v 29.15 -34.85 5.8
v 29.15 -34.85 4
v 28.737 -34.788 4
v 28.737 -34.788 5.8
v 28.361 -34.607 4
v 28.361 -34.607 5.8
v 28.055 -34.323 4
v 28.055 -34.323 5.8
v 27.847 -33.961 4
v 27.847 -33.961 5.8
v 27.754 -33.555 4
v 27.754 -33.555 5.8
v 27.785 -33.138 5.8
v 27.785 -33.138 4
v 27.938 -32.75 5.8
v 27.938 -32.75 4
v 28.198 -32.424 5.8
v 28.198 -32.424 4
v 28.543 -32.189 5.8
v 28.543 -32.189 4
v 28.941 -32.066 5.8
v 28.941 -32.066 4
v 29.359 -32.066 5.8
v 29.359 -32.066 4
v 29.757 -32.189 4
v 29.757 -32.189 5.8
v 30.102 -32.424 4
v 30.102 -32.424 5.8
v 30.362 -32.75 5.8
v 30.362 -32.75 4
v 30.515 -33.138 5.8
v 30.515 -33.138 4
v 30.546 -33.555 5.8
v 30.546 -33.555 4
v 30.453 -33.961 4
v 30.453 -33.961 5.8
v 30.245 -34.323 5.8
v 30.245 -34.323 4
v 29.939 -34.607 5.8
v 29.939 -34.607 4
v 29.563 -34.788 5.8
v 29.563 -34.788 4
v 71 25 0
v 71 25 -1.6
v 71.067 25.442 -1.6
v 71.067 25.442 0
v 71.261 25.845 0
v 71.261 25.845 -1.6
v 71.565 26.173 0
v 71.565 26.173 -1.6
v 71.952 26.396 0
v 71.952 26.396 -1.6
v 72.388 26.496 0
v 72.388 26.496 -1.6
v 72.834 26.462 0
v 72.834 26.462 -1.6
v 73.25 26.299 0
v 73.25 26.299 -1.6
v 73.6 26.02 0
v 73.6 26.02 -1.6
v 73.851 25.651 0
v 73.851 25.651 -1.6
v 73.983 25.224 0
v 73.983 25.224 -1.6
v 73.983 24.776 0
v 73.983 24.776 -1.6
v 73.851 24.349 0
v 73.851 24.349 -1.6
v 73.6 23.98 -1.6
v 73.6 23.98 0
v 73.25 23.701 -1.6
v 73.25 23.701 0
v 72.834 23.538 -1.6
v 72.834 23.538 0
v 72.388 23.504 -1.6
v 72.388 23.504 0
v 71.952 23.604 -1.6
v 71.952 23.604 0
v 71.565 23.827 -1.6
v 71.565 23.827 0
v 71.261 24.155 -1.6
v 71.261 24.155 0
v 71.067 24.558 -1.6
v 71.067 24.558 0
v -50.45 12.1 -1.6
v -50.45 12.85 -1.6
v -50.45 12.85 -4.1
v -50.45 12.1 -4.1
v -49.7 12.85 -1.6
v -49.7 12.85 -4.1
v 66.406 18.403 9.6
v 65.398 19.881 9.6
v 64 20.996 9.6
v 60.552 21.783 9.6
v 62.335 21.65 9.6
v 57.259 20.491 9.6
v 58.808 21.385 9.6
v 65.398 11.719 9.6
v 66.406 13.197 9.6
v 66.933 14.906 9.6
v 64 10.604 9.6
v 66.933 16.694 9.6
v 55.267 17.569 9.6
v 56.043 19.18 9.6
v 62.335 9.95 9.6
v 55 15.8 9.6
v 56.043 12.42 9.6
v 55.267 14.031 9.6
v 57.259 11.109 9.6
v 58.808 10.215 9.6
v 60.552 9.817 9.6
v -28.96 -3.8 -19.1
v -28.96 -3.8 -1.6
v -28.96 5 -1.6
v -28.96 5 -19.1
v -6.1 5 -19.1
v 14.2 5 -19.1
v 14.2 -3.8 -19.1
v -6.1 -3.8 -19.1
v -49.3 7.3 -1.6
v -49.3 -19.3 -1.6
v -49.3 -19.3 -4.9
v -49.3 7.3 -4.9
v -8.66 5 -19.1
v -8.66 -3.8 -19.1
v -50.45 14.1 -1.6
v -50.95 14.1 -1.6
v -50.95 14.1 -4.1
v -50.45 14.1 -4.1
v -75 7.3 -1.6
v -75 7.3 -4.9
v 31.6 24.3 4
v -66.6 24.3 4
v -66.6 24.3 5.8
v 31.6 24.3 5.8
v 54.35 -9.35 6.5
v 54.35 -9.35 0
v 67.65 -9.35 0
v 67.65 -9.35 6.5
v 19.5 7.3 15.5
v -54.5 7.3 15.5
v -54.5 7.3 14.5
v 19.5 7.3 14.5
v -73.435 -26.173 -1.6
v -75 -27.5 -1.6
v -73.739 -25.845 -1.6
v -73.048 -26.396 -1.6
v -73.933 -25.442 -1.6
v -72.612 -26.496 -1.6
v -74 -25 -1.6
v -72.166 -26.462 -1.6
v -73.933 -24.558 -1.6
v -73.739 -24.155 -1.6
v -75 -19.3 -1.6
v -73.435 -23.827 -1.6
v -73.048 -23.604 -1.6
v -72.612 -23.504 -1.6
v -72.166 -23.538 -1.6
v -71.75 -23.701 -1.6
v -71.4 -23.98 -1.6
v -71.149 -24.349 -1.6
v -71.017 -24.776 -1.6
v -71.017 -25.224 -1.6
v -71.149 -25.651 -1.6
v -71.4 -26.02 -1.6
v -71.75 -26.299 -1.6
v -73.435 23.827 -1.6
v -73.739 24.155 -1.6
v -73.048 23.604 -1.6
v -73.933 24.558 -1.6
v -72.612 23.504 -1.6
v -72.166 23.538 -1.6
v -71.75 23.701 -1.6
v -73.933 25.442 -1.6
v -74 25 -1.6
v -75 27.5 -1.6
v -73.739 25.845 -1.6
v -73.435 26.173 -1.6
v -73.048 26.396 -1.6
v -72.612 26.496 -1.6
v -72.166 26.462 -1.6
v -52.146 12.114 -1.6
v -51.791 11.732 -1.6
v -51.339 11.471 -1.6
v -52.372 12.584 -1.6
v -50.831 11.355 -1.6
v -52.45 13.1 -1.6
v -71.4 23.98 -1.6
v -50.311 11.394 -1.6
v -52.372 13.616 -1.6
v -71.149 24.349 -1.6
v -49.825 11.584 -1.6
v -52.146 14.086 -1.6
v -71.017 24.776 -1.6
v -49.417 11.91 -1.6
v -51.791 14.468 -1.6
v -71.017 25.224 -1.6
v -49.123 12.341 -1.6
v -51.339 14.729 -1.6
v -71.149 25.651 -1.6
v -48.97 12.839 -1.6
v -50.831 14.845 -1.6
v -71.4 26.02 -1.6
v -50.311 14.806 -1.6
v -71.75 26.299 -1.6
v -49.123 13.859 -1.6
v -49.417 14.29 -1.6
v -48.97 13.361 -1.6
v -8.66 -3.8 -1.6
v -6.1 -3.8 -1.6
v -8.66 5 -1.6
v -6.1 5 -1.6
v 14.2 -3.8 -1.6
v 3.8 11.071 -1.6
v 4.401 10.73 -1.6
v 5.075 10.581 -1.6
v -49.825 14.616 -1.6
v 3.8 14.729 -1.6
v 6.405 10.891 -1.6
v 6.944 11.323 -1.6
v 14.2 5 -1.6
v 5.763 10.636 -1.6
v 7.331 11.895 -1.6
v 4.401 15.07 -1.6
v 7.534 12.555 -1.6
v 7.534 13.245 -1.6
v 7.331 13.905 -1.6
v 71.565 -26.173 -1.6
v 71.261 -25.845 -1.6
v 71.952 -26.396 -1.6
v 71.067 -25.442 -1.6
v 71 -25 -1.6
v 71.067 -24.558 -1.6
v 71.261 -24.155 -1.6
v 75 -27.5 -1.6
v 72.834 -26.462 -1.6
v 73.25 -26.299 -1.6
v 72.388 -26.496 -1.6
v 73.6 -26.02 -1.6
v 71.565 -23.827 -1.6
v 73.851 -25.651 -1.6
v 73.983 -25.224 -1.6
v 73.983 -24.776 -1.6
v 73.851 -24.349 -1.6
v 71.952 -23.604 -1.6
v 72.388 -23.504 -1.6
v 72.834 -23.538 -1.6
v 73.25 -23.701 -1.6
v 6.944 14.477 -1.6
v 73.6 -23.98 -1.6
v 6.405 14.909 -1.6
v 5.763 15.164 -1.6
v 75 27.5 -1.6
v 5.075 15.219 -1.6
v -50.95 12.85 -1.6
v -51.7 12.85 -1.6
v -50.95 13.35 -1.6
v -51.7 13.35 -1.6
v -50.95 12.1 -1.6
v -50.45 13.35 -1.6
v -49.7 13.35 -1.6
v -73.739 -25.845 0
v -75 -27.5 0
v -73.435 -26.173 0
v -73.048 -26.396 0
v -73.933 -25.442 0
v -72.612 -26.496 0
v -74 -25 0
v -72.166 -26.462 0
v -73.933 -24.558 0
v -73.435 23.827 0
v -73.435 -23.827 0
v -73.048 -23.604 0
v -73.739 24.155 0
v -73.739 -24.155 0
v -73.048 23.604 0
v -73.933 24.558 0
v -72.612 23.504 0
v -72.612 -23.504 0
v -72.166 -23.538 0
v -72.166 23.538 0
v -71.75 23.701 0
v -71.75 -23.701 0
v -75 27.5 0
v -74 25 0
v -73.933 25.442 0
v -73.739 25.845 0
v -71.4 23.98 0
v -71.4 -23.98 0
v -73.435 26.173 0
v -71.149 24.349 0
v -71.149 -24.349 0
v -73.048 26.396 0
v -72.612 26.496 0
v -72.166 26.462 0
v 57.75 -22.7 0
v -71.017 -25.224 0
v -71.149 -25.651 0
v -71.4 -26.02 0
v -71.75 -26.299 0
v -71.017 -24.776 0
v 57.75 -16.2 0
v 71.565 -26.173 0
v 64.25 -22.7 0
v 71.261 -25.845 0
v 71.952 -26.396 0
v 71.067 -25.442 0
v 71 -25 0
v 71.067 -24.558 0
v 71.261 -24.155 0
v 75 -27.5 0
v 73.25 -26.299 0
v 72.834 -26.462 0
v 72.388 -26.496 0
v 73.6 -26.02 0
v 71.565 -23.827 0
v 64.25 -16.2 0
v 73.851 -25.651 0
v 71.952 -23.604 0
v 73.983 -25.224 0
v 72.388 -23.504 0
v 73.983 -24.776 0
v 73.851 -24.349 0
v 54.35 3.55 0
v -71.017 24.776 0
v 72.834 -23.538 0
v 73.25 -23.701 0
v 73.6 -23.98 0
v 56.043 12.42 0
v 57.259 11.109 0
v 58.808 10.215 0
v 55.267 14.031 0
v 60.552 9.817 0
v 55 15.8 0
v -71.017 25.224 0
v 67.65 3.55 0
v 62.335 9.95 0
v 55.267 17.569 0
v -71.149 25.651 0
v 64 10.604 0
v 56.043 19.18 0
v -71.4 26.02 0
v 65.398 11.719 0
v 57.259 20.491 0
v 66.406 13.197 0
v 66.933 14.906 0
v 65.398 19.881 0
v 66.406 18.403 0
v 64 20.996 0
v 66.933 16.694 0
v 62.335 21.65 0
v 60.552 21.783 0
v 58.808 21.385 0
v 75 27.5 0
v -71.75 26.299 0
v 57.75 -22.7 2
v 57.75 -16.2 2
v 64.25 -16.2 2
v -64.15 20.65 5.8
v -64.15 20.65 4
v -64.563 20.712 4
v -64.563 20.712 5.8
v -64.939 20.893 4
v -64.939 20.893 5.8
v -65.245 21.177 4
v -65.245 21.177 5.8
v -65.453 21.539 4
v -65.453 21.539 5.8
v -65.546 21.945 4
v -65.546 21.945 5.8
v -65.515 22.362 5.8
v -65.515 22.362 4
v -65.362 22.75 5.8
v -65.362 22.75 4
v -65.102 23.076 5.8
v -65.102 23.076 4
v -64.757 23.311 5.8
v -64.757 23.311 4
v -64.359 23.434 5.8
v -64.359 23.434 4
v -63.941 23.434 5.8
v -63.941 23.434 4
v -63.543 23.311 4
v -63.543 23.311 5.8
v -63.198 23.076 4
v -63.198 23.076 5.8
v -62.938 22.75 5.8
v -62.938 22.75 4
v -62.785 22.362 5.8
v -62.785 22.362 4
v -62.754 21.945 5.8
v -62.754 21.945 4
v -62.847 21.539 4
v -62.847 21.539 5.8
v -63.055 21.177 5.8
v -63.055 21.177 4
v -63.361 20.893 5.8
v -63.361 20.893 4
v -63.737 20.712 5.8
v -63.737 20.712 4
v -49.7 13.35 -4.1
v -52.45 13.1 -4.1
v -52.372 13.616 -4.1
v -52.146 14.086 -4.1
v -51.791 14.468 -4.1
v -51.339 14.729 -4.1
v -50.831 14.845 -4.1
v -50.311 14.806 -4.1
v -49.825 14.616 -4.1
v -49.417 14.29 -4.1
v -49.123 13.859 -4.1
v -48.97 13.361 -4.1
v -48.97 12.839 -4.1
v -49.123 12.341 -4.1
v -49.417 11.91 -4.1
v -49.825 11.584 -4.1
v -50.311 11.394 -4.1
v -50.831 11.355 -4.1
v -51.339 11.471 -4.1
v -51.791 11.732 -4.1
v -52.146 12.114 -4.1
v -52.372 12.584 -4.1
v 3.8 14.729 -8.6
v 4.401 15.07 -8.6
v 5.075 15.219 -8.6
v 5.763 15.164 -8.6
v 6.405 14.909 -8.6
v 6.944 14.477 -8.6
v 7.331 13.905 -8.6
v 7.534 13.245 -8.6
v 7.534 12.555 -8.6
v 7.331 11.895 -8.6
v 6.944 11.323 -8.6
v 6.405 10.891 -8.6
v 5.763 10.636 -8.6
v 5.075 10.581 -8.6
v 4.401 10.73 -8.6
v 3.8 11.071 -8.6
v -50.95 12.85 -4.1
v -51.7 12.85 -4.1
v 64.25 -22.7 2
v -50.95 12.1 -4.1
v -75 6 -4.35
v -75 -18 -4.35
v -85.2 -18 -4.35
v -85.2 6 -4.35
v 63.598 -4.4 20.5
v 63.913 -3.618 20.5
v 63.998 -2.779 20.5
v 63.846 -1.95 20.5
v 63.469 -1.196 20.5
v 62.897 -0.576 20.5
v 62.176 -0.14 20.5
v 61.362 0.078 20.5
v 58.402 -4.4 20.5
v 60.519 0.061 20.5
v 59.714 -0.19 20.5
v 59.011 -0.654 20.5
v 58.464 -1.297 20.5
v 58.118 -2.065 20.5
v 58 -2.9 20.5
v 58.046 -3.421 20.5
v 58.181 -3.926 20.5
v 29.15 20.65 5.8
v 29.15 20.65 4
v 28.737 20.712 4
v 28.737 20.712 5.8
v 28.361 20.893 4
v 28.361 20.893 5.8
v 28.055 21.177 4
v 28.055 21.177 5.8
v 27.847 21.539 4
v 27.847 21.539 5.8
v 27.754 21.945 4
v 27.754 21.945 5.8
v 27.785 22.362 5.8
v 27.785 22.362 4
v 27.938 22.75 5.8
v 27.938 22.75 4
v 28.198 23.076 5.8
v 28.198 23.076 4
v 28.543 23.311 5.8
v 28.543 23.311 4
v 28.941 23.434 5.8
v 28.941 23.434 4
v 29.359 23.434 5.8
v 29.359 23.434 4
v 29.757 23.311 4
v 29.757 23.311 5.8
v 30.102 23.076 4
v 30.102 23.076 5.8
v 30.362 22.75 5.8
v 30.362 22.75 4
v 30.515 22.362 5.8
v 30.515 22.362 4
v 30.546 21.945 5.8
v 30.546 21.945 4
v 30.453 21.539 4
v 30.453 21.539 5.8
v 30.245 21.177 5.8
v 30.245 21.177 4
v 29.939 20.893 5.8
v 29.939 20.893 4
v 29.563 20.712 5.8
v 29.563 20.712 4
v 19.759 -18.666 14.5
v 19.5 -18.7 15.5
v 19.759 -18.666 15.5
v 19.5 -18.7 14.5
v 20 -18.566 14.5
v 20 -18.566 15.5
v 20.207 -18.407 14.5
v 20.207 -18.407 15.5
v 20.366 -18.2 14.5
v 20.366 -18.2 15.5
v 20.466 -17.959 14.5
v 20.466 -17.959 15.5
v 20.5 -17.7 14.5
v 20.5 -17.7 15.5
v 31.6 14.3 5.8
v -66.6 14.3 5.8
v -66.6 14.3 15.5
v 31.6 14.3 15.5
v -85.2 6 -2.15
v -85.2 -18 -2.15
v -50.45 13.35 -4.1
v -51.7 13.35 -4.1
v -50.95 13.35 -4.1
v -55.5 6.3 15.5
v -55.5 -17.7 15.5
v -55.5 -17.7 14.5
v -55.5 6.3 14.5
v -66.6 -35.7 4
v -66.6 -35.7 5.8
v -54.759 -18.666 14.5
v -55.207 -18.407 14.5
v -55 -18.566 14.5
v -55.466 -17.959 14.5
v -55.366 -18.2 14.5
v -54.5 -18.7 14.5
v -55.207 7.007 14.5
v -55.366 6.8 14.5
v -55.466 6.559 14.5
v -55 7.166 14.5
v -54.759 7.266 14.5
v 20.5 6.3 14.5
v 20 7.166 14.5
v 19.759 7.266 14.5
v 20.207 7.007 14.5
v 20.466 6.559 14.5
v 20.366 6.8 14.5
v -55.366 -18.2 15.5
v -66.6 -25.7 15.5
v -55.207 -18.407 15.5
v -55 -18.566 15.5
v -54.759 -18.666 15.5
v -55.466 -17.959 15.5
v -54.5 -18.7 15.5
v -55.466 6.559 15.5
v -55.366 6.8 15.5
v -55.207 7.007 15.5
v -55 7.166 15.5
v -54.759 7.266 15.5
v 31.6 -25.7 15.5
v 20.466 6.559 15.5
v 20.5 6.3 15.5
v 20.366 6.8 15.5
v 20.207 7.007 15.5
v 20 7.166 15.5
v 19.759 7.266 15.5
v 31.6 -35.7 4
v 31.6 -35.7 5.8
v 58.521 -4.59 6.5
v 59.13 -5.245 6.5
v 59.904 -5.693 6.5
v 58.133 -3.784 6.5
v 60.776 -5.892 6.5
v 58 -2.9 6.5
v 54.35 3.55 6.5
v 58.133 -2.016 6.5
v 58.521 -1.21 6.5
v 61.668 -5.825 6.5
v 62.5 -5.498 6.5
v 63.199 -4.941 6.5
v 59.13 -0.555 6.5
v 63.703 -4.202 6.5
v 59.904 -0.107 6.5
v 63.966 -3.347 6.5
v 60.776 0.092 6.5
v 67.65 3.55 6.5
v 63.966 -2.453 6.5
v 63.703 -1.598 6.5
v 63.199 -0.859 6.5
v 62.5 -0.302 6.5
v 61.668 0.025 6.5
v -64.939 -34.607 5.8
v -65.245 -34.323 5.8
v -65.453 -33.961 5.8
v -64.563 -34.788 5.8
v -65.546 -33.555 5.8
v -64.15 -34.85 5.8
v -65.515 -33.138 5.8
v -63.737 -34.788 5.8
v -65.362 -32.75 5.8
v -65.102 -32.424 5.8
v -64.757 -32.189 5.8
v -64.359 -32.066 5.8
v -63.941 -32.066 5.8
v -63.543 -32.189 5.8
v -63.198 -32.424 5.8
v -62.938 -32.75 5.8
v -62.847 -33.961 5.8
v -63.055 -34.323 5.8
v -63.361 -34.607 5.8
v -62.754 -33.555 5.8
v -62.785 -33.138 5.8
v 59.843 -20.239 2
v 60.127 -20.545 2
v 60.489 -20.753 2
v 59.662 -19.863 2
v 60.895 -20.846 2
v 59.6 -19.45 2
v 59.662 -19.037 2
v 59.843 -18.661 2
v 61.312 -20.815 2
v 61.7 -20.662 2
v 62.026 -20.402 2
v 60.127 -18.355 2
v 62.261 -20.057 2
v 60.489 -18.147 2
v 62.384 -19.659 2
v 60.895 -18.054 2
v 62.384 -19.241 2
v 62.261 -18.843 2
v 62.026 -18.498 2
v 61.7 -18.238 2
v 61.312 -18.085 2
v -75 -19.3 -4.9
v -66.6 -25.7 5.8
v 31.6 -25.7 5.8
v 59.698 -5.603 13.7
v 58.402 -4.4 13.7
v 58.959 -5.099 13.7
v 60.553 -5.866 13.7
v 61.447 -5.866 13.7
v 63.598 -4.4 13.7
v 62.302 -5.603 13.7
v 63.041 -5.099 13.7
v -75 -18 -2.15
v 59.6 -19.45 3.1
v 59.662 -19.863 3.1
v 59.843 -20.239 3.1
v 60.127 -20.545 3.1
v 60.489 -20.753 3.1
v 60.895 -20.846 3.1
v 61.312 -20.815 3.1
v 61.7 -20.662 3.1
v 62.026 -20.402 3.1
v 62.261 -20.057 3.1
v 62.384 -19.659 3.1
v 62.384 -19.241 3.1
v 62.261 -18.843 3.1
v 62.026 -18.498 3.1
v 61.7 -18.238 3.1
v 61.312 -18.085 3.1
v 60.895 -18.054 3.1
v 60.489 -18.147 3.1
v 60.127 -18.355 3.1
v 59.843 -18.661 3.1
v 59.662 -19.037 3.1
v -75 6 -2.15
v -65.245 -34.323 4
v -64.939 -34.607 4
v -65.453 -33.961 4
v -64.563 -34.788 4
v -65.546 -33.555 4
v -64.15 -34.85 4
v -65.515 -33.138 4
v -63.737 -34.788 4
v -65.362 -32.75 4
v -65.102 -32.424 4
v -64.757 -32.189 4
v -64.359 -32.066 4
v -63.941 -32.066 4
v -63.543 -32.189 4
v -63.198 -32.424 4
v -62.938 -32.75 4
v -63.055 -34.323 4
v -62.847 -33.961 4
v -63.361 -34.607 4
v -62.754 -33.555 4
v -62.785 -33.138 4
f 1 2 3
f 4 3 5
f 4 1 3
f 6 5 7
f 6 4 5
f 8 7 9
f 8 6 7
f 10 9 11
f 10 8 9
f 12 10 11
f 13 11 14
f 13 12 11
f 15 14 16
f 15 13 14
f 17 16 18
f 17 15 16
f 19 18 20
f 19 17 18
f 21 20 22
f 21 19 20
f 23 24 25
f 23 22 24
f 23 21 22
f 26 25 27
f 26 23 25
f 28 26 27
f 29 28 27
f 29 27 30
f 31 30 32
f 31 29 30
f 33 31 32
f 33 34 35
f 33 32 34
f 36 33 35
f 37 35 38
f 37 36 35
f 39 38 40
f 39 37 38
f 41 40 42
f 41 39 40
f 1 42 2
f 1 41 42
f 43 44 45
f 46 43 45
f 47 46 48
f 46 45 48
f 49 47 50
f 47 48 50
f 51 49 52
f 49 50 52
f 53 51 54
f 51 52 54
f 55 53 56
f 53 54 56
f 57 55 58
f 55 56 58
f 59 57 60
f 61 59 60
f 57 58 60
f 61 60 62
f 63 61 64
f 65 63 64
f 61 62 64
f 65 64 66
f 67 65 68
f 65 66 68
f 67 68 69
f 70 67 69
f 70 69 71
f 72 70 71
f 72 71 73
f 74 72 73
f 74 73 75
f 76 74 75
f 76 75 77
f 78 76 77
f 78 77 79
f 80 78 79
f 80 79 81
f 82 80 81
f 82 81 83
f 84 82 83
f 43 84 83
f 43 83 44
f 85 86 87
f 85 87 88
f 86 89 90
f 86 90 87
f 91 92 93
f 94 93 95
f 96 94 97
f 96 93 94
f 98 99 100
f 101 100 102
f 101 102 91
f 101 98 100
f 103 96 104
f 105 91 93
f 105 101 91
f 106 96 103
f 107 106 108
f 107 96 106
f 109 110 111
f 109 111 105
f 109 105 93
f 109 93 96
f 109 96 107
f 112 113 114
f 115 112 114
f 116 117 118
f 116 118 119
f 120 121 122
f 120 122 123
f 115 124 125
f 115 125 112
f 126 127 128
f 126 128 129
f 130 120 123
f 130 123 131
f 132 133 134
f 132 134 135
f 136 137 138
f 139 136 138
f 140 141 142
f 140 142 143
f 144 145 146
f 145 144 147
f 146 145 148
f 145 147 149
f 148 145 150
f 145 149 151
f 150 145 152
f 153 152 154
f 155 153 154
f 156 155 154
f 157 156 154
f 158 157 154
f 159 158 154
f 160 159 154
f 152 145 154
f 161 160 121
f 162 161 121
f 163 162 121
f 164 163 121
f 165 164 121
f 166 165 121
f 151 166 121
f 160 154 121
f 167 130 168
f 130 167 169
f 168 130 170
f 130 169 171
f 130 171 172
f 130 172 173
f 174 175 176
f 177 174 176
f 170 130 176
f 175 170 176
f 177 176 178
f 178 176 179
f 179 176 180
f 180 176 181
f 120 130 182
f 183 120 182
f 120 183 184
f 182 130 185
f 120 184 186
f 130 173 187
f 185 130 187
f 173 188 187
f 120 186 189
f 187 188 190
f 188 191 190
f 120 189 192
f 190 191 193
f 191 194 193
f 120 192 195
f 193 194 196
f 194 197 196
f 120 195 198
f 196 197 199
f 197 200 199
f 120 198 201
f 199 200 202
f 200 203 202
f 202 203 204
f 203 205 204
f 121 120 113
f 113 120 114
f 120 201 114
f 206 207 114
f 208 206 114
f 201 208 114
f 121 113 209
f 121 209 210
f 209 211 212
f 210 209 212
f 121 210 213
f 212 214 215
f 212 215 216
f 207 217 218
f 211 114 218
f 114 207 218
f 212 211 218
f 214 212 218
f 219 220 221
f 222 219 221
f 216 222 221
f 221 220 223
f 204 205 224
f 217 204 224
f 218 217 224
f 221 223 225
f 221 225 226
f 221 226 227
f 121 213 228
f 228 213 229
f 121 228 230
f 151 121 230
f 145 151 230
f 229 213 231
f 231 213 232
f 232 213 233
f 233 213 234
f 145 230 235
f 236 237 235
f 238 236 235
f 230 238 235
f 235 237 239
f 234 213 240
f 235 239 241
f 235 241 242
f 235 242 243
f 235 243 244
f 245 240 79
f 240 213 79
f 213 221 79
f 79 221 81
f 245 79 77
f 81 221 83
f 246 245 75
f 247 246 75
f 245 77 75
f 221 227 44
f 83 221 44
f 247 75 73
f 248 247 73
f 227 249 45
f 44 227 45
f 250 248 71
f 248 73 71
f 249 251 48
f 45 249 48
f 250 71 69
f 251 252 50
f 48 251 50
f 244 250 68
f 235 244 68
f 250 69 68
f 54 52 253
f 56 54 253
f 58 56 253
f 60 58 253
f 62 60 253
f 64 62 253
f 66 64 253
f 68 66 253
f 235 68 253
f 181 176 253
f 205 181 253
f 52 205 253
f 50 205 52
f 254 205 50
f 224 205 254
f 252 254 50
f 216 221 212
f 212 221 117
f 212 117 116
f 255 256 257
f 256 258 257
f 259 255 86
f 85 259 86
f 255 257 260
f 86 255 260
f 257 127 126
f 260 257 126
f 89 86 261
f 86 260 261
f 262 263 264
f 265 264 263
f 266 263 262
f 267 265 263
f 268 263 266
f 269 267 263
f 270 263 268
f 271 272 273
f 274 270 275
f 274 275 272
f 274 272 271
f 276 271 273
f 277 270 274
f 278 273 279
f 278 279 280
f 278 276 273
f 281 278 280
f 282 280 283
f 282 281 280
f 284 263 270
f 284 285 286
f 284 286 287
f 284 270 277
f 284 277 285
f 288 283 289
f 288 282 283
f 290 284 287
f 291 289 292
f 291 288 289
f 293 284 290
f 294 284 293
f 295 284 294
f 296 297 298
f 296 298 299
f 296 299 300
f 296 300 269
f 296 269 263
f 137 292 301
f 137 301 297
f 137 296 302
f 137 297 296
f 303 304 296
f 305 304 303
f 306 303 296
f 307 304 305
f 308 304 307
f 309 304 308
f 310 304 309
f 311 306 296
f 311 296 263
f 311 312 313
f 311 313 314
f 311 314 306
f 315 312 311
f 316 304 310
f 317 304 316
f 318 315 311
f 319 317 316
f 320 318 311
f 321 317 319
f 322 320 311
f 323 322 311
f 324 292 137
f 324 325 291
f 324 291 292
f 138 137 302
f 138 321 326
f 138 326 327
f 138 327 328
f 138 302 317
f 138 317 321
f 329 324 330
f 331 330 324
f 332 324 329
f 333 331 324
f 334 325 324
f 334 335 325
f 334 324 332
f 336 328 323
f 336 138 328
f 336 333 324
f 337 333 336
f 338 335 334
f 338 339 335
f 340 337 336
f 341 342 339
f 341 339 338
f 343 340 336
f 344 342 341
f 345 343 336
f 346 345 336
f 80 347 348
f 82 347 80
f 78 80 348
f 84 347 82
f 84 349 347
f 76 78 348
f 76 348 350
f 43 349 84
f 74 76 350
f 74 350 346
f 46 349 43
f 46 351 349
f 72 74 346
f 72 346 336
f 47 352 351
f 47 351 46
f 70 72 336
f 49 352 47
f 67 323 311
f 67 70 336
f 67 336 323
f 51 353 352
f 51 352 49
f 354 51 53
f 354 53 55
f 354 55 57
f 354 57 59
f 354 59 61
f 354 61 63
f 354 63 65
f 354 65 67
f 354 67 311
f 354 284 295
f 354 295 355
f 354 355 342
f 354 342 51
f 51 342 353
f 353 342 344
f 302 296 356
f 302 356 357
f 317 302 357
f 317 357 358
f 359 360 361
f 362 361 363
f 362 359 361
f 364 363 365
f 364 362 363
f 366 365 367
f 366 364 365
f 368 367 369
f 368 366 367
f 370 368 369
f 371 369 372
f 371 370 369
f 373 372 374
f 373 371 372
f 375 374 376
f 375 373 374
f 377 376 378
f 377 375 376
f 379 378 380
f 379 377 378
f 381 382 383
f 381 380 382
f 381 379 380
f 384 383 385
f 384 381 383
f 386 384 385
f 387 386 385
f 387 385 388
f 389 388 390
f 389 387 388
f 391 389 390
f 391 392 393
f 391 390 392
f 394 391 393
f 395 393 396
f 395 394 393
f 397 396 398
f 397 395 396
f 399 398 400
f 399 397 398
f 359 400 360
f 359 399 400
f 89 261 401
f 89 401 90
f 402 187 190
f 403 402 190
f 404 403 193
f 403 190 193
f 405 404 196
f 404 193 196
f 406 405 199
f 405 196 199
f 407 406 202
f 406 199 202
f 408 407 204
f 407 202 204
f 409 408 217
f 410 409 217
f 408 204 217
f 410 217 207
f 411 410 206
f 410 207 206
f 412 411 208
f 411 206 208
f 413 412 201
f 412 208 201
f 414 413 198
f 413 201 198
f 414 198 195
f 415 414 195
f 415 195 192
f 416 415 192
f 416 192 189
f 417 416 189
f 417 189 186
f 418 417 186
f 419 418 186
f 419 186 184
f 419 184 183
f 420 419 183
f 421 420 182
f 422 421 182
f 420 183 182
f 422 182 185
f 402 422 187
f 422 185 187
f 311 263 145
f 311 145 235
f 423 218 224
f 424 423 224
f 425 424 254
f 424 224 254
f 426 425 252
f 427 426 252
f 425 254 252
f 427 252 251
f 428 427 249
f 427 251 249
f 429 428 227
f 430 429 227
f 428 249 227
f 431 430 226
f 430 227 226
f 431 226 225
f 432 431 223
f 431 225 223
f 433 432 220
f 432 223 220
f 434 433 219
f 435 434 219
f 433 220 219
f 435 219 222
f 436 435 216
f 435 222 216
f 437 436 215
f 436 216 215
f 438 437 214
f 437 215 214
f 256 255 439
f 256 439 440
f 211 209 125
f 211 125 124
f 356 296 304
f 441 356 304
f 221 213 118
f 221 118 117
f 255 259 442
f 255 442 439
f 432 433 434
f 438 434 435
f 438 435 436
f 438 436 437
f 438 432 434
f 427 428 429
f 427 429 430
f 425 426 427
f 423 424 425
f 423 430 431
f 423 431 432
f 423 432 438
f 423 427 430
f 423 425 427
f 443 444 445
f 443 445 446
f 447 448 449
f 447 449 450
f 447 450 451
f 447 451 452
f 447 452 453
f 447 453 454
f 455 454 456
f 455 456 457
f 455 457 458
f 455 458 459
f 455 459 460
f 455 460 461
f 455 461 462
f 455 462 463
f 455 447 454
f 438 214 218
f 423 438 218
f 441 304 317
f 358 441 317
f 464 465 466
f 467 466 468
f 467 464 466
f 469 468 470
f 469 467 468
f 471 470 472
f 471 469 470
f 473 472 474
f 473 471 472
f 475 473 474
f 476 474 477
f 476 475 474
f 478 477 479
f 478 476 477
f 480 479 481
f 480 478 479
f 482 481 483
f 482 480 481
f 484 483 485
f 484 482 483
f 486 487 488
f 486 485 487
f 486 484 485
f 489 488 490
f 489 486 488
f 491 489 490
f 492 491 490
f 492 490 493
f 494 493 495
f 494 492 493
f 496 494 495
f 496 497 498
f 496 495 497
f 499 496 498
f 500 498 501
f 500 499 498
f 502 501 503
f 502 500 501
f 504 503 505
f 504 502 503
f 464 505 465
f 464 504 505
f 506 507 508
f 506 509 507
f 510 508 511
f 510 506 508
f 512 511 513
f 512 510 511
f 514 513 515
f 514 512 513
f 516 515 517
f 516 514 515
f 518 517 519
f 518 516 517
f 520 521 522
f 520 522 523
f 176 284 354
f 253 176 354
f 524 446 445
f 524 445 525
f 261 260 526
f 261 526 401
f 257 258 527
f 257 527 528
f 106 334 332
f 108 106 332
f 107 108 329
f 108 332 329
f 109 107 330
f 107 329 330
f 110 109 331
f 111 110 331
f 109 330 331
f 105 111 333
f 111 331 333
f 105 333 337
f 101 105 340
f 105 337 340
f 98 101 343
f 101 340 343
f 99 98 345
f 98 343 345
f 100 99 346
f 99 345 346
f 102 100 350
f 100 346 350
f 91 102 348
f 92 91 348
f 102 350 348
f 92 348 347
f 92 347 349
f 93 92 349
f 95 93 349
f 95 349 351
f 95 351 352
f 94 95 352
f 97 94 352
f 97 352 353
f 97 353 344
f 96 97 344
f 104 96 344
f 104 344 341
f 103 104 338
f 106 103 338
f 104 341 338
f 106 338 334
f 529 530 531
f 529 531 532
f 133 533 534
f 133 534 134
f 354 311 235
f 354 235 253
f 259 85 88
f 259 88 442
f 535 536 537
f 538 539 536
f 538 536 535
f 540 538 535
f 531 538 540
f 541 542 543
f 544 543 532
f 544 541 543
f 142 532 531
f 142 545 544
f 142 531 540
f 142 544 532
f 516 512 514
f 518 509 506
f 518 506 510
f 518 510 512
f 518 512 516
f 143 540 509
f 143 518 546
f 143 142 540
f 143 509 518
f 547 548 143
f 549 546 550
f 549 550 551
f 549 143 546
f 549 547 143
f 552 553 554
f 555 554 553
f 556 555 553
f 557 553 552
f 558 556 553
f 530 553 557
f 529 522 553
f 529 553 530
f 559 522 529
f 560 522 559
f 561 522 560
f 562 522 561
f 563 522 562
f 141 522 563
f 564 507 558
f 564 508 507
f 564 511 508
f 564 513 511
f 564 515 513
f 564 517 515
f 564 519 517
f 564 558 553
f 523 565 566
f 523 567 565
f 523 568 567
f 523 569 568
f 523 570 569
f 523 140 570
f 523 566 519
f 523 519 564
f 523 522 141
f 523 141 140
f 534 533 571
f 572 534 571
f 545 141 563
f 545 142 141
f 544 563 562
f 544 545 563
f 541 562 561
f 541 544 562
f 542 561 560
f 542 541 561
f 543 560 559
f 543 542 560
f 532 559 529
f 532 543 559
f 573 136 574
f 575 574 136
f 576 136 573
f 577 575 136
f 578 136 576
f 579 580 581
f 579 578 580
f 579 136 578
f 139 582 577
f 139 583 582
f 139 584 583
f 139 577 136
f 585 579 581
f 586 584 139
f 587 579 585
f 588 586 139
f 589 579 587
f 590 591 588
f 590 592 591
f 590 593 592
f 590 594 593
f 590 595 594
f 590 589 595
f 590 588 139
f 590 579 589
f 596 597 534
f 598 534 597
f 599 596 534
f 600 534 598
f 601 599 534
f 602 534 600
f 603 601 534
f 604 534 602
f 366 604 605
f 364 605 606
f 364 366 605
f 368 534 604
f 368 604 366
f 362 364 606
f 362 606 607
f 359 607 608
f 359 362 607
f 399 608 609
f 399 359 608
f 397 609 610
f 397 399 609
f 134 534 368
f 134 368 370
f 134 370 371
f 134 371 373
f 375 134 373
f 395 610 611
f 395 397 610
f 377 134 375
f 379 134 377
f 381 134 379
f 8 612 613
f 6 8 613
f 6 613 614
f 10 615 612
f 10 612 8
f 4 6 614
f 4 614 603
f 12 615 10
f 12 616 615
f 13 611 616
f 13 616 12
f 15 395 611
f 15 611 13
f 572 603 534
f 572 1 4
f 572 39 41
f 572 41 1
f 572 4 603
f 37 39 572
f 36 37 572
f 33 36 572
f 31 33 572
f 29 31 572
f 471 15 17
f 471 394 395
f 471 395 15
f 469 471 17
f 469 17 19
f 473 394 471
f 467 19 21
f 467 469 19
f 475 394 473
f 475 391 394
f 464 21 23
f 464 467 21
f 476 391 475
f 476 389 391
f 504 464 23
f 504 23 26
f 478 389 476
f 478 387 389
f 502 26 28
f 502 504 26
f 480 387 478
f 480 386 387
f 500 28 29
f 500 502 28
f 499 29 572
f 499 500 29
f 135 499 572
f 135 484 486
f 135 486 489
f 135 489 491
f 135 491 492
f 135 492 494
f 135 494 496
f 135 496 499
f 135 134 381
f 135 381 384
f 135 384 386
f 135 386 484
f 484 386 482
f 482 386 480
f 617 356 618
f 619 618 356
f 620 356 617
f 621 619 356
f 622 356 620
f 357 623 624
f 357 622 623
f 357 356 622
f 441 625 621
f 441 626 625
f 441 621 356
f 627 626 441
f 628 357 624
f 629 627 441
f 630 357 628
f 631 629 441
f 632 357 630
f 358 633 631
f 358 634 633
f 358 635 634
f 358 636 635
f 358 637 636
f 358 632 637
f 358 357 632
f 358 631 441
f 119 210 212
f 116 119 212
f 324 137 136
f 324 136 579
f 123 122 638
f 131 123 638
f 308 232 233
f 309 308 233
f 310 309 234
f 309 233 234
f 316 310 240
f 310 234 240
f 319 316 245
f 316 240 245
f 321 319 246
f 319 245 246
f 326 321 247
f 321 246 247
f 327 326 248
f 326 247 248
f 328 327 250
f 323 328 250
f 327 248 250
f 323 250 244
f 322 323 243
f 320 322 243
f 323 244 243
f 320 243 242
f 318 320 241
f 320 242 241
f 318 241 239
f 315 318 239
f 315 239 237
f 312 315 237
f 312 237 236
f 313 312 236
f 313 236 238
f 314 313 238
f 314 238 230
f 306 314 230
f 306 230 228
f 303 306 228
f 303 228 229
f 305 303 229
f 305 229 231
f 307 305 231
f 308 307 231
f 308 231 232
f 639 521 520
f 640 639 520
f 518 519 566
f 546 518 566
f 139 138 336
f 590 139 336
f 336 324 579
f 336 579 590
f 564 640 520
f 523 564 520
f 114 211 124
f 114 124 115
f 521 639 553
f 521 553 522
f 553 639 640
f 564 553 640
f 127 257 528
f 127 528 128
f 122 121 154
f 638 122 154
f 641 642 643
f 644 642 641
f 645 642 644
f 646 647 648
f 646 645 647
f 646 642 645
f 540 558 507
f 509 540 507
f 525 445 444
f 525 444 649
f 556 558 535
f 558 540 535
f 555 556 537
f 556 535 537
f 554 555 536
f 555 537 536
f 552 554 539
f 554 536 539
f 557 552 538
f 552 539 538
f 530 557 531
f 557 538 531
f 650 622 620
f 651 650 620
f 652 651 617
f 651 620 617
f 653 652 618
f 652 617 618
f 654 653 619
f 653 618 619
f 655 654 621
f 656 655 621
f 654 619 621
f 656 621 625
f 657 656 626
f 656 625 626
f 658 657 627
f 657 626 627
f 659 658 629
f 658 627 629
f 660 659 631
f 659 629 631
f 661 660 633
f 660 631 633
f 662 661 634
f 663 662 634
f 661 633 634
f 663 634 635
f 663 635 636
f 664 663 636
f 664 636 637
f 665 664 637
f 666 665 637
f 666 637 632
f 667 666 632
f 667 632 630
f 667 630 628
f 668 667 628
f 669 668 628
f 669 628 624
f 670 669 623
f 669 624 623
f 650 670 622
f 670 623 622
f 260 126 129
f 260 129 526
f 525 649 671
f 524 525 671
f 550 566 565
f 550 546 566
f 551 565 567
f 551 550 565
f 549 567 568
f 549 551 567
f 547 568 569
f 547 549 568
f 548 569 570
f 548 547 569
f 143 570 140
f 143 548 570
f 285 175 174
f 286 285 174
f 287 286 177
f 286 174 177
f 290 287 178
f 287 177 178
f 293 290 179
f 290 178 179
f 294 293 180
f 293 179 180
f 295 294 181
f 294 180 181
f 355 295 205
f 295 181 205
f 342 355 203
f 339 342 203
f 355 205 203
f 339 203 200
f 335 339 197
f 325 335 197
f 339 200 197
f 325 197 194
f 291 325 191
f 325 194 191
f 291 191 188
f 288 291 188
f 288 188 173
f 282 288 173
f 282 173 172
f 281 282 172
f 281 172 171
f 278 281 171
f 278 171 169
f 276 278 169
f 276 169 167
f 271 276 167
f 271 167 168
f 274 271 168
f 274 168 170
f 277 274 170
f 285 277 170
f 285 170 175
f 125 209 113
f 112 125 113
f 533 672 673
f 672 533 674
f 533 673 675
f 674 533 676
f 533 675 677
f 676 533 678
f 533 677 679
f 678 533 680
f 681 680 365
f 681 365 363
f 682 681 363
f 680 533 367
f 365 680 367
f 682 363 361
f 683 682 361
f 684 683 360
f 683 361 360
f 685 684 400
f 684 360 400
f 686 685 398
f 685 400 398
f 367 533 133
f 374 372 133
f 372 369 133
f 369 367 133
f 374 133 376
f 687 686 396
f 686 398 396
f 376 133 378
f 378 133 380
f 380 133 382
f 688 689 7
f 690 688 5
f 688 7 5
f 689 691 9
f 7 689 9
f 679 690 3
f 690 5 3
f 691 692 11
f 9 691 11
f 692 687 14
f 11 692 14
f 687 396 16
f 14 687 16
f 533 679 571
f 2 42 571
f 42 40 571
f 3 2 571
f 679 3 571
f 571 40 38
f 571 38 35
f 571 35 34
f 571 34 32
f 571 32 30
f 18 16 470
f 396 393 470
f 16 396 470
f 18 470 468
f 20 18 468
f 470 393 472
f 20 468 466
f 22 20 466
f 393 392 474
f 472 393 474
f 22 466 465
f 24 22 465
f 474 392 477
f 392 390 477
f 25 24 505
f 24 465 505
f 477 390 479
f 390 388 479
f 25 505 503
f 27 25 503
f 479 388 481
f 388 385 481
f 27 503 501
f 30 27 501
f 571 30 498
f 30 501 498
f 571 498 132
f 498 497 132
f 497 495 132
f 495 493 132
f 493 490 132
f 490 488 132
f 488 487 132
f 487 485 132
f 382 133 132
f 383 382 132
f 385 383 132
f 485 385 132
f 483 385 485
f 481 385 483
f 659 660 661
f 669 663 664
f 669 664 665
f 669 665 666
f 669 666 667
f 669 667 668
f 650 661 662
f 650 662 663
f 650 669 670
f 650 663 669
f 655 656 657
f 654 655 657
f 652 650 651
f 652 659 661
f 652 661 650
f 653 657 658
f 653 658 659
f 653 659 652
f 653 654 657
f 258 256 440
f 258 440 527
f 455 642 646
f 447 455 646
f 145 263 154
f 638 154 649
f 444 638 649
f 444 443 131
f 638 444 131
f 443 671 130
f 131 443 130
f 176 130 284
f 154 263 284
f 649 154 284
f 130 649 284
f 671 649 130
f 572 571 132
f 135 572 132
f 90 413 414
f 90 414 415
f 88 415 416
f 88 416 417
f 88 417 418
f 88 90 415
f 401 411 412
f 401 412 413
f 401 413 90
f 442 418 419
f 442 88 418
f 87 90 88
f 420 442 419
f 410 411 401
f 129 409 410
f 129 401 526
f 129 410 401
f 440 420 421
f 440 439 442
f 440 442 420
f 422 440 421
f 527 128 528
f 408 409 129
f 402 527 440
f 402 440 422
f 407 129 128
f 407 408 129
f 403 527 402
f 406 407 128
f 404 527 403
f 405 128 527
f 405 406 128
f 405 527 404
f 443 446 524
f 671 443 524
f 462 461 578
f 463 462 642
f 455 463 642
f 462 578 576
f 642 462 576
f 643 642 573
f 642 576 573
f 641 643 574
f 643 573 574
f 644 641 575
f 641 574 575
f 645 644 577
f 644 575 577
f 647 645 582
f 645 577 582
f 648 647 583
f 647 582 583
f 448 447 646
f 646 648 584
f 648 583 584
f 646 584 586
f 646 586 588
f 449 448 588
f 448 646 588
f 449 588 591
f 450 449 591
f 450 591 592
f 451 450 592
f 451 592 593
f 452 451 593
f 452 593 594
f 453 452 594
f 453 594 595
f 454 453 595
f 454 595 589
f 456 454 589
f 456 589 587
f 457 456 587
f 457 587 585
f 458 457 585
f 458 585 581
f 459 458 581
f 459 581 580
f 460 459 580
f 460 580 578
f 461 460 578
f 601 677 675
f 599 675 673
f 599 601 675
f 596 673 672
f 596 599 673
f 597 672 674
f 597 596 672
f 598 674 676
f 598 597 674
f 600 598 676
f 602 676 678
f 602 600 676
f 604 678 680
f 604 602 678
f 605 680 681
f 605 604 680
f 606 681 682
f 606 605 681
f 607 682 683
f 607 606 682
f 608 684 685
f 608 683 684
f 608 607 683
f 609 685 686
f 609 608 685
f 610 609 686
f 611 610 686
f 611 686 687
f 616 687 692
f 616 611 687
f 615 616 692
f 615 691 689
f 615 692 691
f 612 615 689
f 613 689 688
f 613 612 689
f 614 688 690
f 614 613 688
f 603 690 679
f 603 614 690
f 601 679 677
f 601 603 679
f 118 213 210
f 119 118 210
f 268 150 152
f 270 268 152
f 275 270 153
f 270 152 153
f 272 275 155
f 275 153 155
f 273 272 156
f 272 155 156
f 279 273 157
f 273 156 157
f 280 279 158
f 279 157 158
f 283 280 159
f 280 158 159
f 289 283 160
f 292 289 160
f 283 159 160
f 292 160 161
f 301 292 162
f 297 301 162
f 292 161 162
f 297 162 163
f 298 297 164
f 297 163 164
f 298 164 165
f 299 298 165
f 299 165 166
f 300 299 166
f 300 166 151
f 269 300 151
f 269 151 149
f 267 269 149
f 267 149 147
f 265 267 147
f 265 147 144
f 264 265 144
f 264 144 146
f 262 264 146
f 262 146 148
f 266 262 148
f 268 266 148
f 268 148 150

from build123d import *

# Parameters (mm, degrees)
SKETCH1_W                           = 150
SKETCH1_H                           = 55
PCB_DEPTH                           = 1.6
F_3_0_3_DIAMETER_HOLE1_D            = 3
F_3_0_3_DIAMETER_HOLE1_DEPTH        = 4
F_3_0_3_DIAMETER_HOLE1_TIP          = 0.901290929
SKETCH4_W                           = 20.3
SKETCH4_H                           = 8.8
IDC_CONN_DEPTH                      = 17.5
LPATTERN1_COUNT                     = 2
LPATTERN1_PITCH                     = 22.86
SKETCH5_W                           = 25.7
SKETCH5_H                           = 26.6
SD_SOCKET_DEPTH                     = 3.3
SKETCH6_W                           = 2.2
SKETCH6_H                           = 24
SD_CARD_DEPTH                       = 10.2
SKETCH7_R                           = 1.75
CONTRAST_POT_DEPTH                  = 2.5
EXTRUDE_2N3901_DEPTH                = 7
SKETCH9_W                           = 98.2
SKETCH9_H                           = 60
LCD_PCB_DEPTH                       = 1.8
SKETCH10_W                          = 98.2
SKETCH10_H                          = 40
LCD_HOUSING_DEPTH                   = 9.7
SKETCH11_W                          = 76
SKETCH11_H                          = 26
CUT_EXTRUDE1_DEPTH                  = 1
FILLET1_R                           = 1
F_2_8_2_8_DIAMETER_HOLE1_AT_2_COUNT = 2
F_2_8_2_8_DIAMETER_HOLE1_AT_2_PITCH = 93.3
F_2_8_2_8_DIAMETER_HOLE1_AT_3_COUNT = 2
F_2_8_2_8_DIAMETER_HOLE1_AT_3_PITCH = 108.55938467
F_2_8_2_8_DIAMETER_HOLE1_AT_4_COUNT = 2
F_2_8_2_8_DIAMETER_HOLE1_AT_4_PITCH = 55.5
SKETCH14_R                          = 6
BUZZER_DEPTH                        = 9.6
SKETCH15_W                          = 13.3
SKETCH15_H                          = 12.9
ENC_BODY_DEPTH                      = 6.5
SKETCH16_R                          = 3
ENC_SHAFT_DEPTH                     = 14
SKETCH17_W                          = 5.196152422
SKETCH17_H                          = 1.5
ENC_SHAFT_FLAT_DEPTH                = 6.8
SKETCH18_W                          = 6.5
SKETCH18_H                          = 6.5
E_STOP_SW_BODY_DEPTH                = 2
SKETCH19_R                          = 1.4
E_STOP_SW_BUTTON_DEPTH              = 1.1


with BuildPart() as part:
    # Sketch1 → PCB (new body)
    with BuildSketch(Plane.XY):
        Rectangle(SKETCH1_W, SKETCH1_H)
    extrude(amount=-PCB_DEPTH)

    # Ø3.0 (3) Diameter Hole1
    with Locations(Plane.XY):
        with Locations((-72.5, 25), (72.5, 25), (72.5, -25), (-72.5, -25)):
            Hole(F_3_0_3_DIAMETER_HOLE1_D / 2, depth=F_3_0_3_DIAMETER_HOLE1_DEPTH)
            with Locations((0, 0, -(F_3_0_3_DIAMETER_HOLE1_DEPTH + F_3_0_3_DIAMETER_HOLE1_TIP / 2))):  # 118° drill point
                Cone(0, F_3_0_3_DIAMETER_HOLE1_D / 2, F_3_0_3_DIAMETER_HOLE1_TIP, mode=Mode.SUBTRACT)

    # Sketch4 → IDC conn (add)
    with BuildSketch(Plane(origin=(0, 0, -1.6), x_dir=(-1, 0, 0), z_dir=(0, 0, -1))):
        with Locations((-4.05, 0.6)):
            Rectangle(SKETCH4_W, SKETCH4_H)
    idc_conn = extrude(amount=IDC_CONN_DEPTH)

    # LPattern1: IDC conn ×2
    with Locations(*[(-i * LPATTERN1_PITCH, 0, 0) for i in range(1, LPATTERN1_COUNT)]):
        add(idc_conn)



with BuildPart() as body_2:
    # Sketch5 → SD socket (new body)
    with BuildSketch(Plane(origin=(0, 0, -1.6), x_dir=(-1, 0, 0), z_dir=(0, 0, -1))):
        with Locations((62.15, -6)):
            Rectangle(SKETCH5_W, SKETCH5_H)
    extrude(amount=SD_SOCKET_DEPTH)


with BuildPart() as part_1:
    add(part.part)

    add(body_2.part)  # SD card merges body 2
    # Sketch6 → SD card (add)
    with BuildSketch(Plane.ZY.offset(75)):
        with Locations((-3.25, -6)):
            Rectangle(SKETCH6_W, SKETCH6_H)
    extrude(amount=SD_CARD_DEPTH)

    # Sketch7 → Contrast pot (add)
    with BuildSketch(Plane(origin=(0, 0, -1.6), x_dir=(-1, 0, 0), z_dir=(0, 0, -1))):
        with Locations((50.7, 13.1)):
            Circle(SKETCH7_R)
        Polygon((50.95, 12.85), (51.7, 12.85), (51.7, 13.35), (50.95, 13.35), (50.95, 14.1), (50.45, 14.1), (50.45, 13.35), (49.7, 13.35), (49.7, 12.85), (50.45, 12.85), (50.45, 12.1), (50.95, 12.1), align=None, mode=Mode.SUBTRACT)
    extrude(amount=CONTRAST_POT_DEPTH)

    # Sketch8 → 2N3901 (add)
    with BuildSketch(Plane(origin=(0, 0, -1.6), x_dir=(-1, 0, 0), z_dir=(0, 0, -1))):
        with BuildLine():
            Line((-3.8, 11.070683188), (-3.8, 14.729316812))
            ThreePointArc((-3.8, 14.729316812), (-7.56, 12.9), (-3.8, 11.070683188))
        make_face()
    extrude(amount=EXTRUDE_2N3901_DEPTH)

    # Sketch14 → buzzer (add)
    with BuildSketch(Plane.XY):
        with Locations(Location((61, 15.8, 0), (0, 0, 180))):
            Circle(SKETCH14_R)
    extrude(amount=BUZZER_DEPTH)

    # Sketch15 → enc body (add)
    with BuildSketch(Plane.XY):
        with Locations((61, -2.9)):
            Rectangle(SKETCH15_W, SKETCH15_H)
    extrude(amount=ENC_BODY_DEPTH)

    # Sketch16 → enc shaft (add)
    with BuildSketch(Plane.XY.offset(6.5)):
        with Locations(Location((61, -2.9, 0), (0, 0, 180))):
            Circle(SKETCH16_R)
    extrude(amount=ENC_SHAFT_DEPTH)

    # Sketch17 → enc shaft flat (cut)
    with BuildSketch(Plane.XY.offset(20.5)):
        with Locations((61, -5.15)):
            Rectangle(SKETCH17_W, SKETCH17_H)
    extrude(amount=-ENC_SHAFT_FLAT_DEPTH, mode=Mode.SUBTRACT)

    # Sketch18 → e-stop sw body (add)
    with BuildSketch(Plane.XY):
        with Locations((61, -19.45)):
            Rectangle(SKETCH18_W, SKETCH18_H)
    extrude(amount=E_STOP_SW_BODY_DEPTH)

    # Sketch19 → e-stop sw button (add)
    with BuildSketch(Plane.XY.offset(2)):
        with Locations(Location((61, -19.45, 0), (0, 0, 180))):
            Circle(SKETCH19_R)
    extrude(amount=E_STOP_SW_BUTTON_DEPTH)


with BuildPart() as body_2_2:
    # Sketch9 → LCD PCB (new body)
    with BuildSketch(Plane.XY.offset(4)):
        with Locations((-17.5, -5.7)):
            Rectangle(SKETCH9_W, SKETCH9_H)
    extrude(amount=LCD_PCB_DEPTH)

    # Sketch12 → Ø2.8 (2.8) Diameter Hole1 (revolve, cut)
    with BuildSketch(Plane(origin=(-64.15, 22.05, 5.8), x_dir=(0, -1, 0), z_dir=(1, 0, 0))):
        Polygon((0, 0), (0, 4.841204867), (1.4, 4), (1.4, 0), align=None)
    f_2_8_2_8_diameter_hole1 = revolve(axis=Axis((-64.15, 22.05, 12.15), (0, 0, -1)), mode=Mode.SUBTRACT)

    # Ø2.8 (2.8) Diameter Hole1 at 2: Ø2.8 (2.8) Diameter Hole1 ×2
    with Locations(*[(i * F_2_8_2_8_DIAMETER_HOLE1_AT_2_PITCH, 0, 0) for i in range(1, F_2_8_2_8_DIAMETER_HOLE1_AT_2_COUNT)]):
        add(f_2_8_2_8_diameter_hole1, mode=Mode.SUBTRACT)

    # Ø2.8 (2.8) Diameter Hole1 at 3: Ø2.8 (2.8) Diameter Hole1 ×2
    with Locations(*[Vector(0.8594374432328761, -0.511240922823415, 0) * (i * F_2_8_2_8_DIAMETER_HOLE1_AT_3_PITCH) for i in range(1, F_2_8_2_8_DIAMETER_HOLE1_AT_3_COUNT)]):
        add(f_2_8_2_8_diameter_hole1, mode=Mode.SUBTRACT)

    # Ø2.8 (2.8) Diameter Hole1 at 4: Ø2.8 (2.8) Diameter Hole1 ×2
    with Locations(*[(0, -i * F_2_8_2_8_DIAMETER_HOLE1_AT_4_PITCH, 0) for i in range(1, F_2_8_2_8_DIAMETER_HOLE1_AT_4_COUNT)]):
        add(f_2_8_2_8_diameter_hole1, mode=Mode.SUBTRACT)


with BuildPart() as body_3:
    # Sketch10 → LCD housing (new body)
    with BuildSketch(Plane.XY.offset(5.8)):
        with Locations((-17.5, -5.7)):
            Rectangle(SKETCH10_W, SKETCH10_H)
    extrude(amount=LCD_HOUSING_DEPTH)

    # Sketch11 → Cut-Extrude1 (cut)
    with BuildSketch(Plane.XY.offset(15.5)):
        with Locations((-17.5, -5.7)):
            Rectangle(SKETCH11_W, SKETCH11_H)
    extrude(amount=-CUT_EXTRUDE1_DEPTH, mode=Mode.SUBTRACT)

    # Fillet1
    fillet1_edges = [body_3.edges().sort_by_distance(p)[0] for p in [
        (-55.5, -18.7, 15),
        (-55.5, 7.3, 15),
        (20.5, 7.3, 15),
        (20.5, -18.7, 15),
    ]]
    fillet(fillet1_edges, radius=FILLET1_R)


solid = Compound([part_1.part, body_2_2.part, body_3.part])
